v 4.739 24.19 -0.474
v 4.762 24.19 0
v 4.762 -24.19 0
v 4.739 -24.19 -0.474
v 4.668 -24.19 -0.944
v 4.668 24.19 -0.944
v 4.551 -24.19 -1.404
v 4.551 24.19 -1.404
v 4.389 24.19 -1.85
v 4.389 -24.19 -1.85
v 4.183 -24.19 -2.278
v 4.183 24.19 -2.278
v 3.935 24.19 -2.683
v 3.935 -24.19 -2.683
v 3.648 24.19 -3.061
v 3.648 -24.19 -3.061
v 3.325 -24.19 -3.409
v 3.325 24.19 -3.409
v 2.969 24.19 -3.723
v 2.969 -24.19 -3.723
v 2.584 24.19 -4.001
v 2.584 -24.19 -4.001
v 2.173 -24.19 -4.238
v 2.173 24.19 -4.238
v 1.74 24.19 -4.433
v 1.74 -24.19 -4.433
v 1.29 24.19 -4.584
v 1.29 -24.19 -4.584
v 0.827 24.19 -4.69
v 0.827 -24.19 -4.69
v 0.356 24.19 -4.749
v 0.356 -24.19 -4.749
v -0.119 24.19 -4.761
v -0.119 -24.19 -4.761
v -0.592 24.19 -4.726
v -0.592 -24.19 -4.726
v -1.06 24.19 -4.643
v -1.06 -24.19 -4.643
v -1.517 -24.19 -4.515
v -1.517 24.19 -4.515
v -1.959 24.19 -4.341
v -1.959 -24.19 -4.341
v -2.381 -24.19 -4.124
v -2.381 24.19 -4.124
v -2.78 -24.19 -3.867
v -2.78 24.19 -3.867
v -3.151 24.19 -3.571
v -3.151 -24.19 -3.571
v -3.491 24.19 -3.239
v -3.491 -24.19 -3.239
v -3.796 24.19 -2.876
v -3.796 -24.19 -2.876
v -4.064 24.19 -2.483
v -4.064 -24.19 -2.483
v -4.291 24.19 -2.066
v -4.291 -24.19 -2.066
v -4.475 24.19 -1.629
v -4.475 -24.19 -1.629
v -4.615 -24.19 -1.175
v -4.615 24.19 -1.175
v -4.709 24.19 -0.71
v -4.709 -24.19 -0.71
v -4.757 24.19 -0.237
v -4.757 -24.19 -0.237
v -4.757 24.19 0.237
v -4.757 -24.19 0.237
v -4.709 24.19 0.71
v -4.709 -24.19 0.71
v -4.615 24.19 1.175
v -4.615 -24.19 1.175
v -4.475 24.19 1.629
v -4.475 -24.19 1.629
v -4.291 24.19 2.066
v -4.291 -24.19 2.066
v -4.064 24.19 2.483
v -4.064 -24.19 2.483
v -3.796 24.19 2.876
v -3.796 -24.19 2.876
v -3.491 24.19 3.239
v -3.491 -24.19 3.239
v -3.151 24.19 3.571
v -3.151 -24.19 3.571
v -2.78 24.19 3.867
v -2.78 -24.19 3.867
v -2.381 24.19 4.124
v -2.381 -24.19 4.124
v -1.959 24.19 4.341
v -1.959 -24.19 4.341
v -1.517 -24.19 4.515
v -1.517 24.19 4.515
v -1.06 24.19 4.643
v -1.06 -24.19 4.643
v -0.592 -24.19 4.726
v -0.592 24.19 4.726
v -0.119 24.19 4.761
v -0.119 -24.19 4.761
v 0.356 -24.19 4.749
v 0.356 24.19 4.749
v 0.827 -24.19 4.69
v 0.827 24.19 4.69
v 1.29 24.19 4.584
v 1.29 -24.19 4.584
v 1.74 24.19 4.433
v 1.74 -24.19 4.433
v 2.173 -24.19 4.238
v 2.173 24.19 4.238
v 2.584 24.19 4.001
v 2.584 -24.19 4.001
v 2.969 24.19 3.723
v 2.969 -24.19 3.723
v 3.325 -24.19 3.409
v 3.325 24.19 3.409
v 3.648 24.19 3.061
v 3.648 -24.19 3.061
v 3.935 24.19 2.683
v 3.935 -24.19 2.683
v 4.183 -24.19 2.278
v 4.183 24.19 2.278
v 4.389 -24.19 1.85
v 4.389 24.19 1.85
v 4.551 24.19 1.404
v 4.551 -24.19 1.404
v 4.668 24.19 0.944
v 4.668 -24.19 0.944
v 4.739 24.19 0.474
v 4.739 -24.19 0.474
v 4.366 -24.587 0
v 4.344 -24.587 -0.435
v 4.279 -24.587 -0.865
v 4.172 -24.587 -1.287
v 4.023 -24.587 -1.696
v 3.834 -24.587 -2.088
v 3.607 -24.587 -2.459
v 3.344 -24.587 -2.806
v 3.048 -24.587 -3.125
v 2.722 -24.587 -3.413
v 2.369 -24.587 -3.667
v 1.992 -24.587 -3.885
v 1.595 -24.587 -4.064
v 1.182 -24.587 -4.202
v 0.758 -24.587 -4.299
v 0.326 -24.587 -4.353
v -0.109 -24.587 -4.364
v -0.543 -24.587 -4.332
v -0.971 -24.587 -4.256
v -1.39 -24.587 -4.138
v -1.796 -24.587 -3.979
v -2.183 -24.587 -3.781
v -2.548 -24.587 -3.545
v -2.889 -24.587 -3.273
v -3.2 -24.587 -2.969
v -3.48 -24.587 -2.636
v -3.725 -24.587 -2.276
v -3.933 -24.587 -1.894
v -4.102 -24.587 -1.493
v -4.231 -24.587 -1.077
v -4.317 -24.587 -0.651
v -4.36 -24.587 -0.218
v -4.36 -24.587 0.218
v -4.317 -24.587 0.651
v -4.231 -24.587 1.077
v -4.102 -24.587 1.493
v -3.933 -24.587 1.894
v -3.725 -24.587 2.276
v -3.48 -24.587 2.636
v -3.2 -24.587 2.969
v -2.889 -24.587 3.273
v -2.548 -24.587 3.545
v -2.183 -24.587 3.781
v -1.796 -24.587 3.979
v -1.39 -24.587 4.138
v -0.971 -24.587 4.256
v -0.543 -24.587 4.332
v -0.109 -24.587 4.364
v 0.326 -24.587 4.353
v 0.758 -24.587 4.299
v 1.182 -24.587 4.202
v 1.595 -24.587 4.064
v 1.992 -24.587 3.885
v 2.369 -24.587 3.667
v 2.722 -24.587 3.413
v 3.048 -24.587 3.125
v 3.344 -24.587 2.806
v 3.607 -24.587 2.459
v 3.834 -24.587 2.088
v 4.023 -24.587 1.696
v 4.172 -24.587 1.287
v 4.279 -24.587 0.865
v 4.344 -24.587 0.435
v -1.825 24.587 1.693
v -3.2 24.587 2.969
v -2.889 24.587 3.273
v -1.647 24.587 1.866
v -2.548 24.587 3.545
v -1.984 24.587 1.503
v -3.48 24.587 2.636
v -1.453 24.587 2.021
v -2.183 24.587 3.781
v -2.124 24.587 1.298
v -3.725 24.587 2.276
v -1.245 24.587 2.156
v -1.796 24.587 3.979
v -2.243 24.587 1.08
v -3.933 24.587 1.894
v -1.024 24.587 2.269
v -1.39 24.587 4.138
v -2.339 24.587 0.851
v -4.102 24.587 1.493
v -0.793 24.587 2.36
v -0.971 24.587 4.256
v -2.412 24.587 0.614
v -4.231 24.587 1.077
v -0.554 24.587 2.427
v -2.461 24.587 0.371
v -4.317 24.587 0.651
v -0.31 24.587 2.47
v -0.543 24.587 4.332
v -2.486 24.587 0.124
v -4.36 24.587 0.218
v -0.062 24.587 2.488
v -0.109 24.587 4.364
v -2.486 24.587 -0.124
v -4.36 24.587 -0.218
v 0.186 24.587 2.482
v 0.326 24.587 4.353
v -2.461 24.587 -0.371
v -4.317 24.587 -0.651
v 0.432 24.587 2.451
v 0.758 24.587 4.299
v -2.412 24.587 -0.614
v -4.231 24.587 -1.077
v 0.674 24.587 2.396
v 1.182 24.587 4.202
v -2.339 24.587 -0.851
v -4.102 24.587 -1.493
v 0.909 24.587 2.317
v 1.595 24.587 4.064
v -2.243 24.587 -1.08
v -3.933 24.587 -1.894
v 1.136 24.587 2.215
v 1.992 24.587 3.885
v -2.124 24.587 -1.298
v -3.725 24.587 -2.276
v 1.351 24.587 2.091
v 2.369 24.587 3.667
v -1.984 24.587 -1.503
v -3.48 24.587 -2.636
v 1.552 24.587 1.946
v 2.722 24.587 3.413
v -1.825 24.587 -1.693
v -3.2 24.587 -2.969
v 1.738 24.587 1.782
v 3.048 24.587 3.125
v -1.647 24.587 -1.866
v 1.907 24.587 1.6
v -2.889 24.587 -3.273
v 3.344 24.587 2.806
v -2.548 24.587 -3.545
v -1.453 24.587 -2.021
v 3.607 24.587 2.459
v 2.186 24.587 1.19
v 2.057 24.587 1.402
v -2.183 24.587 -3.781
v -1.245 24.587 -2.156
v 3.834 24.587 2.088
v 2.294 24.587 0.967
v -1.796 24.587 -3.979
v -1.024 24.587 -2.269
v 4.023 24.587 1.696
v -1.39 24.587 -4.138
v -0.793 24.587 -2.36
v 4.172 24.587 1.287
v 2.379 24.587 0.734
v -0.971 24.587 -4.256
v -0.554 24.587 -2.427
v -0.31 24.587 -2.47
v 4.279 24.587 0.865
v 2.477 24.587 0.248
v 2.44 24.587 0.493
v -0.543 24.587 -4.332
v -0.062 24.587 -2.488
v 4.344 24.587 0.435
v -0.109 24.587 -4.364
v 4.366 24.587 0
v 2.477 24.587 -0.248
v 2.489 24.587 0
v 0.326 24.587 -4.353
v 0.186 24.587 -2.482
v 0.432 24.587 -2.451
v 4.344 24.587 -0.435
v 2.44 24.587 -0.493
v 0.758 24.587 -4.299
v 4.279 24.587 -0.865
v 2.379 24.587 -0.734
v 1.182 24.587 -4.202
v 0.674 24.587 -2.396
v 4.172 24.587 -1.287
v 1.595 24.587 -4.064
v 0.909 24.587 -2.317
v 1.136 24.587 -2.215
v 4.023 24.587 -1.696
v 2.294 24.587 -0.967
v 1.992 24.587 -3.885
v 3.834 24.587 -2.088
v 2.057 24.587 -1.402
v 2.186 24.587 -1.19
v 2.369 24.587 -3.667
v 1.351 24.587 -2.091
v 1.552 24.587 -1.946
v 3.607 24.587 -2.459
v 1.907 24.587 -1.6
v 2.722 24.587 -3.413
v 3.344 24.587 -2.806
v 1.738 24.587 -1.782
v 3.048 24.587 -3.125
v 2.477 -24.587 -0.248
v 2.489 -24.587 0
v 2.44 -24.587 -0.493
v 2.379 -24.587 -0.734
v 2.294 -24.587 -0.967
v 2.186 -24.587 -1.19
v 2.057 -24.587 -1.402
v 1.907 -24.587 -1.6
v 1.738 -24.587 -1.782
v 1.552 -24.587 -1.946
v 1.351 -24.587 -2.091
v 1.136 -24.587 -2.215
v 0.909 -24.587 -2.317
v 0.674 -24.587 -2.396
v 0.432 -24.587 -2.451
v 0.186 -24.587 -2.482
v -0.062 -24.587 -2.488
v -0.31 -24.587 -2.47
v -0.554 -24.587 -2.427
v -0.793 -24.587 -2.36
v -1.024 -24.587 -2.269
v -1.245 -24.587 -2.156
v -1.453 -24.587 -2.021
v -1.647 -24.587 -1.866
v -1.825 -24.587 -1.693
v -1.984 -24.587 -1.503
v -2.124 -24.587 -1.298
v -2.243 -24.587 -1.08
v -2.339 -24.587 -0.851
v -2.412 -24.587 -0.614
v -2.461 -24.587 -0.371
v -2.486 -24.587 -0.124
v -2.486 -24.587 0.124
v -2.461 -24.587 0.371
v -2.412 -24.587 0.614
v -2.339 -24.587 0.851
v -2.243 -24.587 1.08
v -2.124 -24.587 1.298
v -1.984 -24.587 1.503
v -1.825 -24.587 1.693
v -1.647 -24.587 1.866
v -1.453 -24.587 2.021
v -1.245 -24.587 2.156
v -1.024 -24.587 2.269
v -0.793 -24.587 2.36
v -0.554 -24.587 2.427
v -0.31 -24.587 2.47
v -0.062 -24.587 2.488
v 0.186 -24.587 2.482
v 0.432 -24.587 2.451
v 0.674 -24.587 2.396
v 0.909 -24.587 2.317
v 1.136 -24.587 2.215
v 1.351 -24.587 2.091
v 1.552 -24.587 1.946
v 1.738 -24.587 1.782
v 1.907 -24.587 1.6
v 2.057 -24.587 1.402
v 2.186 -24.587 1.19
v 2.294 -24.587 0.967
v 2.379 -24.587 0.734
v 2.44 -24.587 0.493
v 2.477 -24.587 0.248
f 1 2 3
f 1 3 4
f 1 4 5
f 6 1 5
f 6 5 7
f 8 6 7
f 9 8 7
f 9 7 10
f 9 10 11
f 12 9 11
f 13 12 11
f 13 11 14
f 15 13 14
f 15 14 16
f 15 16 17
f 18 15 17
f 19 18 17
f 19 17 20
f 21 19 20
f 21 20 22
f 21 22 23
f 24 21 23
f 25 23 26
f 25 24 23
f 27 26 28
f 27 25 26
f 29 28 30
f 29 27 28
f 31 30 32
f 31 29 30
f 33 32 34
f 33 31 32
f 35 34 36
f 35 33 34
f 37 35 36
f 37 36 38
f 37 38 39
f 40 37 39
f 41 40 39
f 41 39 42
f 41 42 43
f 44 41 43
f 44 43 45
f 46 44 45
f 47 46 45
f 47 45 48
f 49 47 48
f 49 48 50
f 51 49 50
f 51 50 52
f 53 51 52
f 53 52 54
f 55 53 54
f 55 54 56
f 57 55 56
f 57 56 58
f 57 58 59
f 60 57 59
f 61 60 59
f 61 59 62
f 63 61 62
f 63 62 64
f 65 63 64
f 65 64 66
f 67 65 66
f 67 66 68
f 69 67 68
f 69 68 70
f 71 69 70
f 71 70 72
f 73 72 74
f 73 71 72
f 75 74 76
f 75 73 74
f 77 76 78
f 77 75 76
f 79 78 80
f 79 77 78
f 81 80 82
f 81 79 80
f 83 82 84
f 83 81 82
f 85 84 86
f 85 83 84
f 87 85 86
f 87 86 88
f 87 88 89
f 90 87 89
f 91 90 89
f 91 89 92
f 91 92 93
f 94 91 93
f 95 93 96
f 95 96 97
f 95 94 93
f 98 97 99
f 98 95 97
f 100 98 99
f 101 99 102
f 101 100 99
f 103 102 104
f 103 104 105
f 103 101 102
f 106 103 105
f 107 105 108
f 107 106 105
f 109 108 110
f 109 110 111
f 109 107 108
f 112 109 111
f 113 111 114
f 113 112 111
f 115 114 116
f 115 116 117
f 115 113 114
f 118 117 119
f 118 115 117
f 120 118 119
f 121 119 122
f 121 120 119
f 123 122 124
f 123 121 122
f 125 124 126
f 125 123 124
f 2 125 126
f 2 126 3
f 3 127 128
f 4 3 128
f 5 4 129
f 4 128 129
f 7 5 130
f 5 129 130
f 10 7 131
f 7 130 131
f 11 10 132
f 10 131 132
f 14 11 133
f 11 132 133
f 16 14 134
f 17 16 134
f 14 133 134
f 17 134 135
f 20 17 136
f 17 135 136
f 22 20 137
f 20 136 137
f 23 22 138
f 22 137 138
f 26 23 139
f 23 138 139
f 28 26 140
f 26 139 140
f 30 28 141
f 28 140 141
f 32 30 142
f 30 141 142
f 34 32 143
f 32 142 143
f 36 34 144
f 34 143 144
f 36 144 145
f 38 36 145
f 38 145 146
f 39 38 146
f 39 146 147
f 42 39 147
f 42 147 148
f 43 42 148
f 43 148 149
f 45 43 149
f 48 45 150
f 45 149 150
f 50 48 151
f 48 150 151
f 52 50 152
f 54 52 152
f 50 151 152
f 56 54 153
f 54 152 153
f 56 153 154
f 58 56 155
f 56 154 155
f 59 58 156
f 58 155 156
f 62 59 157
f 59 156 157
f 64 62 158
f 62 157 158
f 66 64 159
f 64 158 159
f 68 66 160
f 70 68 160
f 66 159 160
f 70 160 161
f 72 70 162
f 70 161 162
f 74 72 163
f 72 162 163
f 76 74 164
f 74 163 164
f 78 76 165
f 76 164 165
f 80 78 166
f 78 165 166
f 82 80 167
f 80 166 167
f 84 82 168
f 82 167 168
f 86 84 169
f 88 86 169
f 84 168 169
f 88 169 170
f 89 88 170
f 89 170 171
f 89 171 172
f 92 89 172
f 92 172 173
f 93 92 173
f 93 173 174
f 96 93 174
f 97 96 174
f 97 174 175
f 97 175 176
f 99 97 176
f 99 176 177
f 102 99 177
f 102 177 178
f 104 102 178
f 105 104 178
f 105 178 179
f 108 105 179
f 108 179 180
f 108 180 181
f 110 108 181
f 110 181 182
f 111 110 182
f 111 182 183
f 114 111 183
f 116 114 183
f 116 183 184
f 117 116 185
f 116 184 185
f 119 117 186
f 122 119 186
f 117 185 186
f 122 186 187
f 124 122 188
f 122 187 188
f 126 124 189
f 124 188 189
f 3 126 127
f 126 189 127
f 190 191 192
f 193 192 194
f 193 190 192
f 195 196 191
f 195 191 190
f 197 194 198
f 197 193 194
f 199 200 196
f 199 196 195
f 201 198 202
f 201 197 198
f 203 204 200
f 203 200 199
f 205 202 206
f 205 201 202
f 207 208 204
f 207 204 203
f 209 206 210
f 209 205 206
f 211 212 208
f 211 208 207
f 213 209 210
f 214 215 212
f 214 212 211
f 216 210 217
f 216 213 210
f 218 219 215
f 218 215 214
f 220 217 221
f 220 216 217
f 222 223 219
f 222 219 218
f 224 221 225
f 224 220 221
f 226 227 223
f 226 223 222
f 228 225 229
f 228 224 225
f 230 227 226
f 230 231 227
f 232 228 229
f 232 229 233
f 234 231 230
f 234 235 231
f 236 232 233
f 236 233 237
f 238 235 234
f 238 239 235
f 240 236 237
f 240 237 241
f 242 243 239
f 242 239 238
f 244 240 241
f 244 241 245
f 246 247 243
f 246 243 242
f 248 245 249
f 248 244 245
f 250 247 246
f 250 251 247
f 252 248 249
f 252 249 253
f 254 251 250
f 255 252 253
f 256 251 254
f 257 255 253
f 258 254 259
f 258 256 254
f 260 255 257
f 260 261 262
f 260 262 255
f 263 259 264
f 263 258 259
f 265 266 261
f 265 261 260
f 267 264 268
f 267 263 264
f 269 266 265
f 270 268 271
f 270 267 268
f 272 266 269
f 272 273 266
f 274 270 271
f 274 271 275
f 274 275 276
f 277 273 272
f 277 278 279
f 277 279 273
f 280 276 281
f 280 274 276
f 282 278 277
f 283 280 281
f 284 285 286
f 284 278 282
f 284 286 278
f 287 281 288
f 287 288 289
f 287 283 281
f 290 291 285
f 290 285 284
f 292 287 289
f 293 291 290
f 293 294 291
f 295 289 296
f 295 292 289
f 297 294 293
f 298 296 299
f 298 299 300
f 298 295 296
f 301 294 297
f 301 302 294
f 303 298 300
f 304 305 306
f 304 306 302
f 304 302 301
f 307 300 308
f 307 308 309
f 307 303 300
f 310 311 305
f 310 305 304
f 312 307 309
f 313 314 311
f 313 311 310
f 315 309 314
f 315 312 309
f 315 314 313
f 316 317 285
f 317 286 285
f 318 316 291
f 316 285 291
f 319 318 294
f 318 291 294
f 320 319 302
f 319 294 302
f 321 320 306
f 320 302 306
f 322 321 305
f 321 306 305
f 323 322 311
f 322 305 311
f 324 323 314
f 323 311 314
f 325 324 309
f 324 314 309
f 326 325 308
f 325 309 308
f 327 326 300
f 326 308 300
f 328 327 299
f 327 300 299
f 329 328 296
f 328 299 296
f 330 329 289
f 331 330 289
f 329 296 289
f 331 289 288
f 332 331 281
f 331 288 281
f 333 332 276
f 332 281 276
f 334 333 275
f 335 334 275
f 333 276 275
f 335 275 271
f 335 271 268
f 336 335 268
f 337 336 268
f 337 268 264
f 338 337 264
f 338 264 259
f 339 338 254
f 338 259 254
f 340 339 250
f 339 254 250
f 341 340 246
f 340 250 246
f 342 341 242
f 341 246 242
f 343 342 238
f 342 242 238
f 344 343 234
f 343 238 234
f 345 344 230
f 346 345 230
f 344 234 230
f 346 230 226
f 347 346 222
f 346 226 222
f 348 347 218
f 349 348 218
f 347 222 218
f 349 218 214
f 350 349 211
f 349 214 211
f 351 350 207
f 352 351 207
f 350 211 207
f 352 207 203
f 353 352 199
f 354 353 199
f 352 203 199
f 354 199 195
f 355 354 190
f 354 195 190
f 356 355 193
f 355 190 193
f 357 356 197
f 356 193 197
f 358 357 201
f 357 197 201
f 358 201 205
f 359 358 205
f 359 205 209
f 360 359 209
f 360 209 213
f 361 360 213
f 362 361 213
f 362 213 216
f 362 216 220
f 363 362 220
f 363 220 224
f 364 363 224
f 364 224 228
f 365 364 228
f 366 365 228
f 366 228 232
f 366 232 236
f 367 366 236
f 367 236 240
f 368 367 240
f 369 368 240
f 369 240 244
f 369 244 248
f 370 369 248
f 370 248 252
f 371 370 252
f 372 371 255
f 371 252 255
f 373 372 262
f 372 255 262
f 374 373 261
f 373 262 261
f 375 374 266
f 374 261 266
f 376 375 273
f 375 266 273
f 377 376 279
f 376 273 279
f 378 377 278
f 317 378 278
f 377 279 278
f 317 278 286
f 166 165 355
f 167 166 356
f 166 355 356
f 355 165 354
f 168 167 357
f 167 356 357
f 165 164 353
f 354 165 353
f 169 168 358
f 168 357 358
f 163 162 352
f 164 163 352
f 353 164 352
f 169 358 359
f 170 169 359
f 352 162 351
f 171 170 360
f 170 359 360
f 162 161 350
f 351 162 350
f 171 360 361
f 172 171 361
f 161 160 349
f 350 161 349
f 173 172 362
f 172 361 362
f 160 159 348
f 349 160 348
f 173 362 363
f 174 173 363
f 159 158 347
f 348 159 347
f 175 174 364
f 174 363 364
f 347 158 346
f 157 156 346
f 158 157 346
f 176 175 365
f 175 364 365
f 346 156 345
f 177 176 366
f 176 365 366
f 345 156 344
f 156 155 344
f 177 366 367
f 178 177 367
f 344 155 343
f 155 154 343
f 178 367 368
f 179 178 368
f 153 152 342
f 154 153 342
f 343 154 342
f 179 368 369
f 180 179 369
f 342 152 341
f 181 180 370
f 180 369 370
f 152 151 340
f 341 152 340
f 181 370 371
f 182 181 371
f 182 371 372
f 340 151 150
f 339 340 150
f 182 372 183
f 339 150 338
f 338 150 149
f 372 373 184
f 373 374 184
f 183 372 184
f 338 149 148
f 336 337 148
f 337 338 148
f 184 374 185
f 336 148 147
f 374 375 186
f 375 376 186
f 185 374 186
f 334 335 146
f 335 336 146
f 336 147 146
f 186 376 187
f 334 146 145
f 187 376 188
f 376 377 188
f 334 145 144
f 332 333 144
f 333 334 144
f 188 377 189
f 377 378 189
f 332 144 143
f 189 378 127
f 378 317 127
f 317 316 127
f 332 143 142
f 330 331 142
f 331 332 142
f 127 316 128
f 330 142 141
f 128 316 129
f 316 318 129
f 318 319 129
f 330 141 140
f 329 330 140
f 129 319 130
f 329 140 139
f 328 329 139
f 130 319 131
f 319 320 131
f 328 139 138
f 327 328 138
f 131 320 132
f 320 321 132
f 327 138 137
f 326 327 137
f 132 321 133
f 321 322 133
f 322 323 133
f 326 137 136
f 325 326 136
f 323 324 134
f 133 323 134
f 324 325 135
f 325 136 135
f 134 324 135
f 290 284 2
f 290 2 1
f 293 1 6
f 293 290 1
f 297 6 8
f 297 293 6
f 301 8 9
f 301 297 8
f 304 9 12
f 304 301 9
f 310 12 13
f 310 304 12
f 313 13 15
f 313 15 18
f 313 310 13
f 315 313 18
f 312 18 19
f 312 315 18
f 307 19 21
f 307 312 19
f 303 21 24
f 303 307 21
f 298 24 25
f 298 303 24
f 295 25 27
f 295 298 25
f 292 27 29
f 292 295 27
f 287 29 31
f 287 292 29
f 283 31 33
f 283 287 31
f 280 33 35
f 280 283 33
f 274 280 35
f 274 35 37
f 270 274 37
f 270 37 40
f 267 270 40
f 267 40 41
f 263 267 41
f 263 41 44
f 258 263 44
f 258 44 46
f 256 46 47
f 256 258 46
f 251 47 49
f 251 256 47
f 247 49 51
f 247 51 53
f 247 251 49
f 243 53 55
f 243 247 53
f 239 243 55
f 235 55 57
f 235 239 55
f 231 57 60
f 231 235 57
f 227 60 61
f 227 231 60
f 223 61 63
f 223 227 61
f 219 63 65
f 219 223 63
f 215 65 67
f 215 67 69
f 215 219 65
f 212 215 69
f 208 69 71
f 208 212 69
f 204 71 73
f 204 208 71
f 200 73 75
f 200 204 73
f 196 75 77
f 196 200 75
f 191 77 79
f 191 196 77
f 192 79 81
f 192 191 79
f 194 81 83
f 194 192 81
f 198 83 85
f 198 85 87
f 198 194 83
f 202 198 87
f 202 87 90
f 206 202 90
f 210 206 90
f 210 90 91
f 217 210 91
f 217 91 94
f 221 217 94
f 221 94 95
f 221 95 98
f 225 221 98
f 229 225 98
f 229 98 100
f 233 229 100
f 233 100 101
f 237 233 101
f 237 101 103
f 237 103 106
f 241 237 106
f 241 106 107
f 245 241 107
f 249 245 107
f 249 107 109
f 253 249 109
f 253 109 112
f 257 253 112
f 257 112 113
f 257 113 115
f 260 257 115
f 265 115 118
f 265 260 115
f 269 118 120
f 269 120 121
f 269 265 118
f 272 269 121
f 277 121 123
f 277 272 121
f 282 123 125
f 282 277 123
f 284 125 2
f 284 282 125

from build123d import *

# Parameters (mm, degrees)
CROQUIS2_R                = 4.7625
SALIENTE_EXTRUIR1_DEPTH   = 24.5872
CHAFL_N1_SIZE             = 0.396875
CLEARANCE_HOLE_DEPTH      = 26.493003282
CLEARANCE_HOLE_DEPTH_BACK = 26.493003282
CROQUIS4_R                = 2.4892


with BuildPart() as part:
    # Croquis2 → Saliente-Extruir1 (new, symmetric)
    with BuildSketch(Plane(origin=(0, 0, 0), x_dir=(1, 0, 0), z_dir=(0, 1, 0))):
        Circle(CROQUIS2_R)
    extrude(amount=SALIENTE_EXTRUIR1_DEPTH, both=True)

    # Chaflán1
    chafl_n1_edges = [part.edges().sort_by_distance(p)[0] for p in [
        (-4.7625, -24.5872, 0),
        (-4.7625, 24.5872, 0),
    ]]
    chamfer(chafl_n1_edges, length=CHAFL_N1_SIZE)

    # Croquis4 → Clearance Hole (cut, two sides: drawn at the far end of the back side and taken through both)
    with BuildSketch(Plane(origin=(0, 0, 0), x_dir=(1, 0, 0), z_dir=(0, 1, 0)).offset(-CLEARANCE_HOLE_DEPTH_BACK)):
        Circle(CROQUIS4_R)
    extrude(amount=CLEARANCE_HOLE_DEPTH + CLEARANCE_HOLE_DEPTH_BACK, mode=Mode.SUBTRACT)


solid = part.part
